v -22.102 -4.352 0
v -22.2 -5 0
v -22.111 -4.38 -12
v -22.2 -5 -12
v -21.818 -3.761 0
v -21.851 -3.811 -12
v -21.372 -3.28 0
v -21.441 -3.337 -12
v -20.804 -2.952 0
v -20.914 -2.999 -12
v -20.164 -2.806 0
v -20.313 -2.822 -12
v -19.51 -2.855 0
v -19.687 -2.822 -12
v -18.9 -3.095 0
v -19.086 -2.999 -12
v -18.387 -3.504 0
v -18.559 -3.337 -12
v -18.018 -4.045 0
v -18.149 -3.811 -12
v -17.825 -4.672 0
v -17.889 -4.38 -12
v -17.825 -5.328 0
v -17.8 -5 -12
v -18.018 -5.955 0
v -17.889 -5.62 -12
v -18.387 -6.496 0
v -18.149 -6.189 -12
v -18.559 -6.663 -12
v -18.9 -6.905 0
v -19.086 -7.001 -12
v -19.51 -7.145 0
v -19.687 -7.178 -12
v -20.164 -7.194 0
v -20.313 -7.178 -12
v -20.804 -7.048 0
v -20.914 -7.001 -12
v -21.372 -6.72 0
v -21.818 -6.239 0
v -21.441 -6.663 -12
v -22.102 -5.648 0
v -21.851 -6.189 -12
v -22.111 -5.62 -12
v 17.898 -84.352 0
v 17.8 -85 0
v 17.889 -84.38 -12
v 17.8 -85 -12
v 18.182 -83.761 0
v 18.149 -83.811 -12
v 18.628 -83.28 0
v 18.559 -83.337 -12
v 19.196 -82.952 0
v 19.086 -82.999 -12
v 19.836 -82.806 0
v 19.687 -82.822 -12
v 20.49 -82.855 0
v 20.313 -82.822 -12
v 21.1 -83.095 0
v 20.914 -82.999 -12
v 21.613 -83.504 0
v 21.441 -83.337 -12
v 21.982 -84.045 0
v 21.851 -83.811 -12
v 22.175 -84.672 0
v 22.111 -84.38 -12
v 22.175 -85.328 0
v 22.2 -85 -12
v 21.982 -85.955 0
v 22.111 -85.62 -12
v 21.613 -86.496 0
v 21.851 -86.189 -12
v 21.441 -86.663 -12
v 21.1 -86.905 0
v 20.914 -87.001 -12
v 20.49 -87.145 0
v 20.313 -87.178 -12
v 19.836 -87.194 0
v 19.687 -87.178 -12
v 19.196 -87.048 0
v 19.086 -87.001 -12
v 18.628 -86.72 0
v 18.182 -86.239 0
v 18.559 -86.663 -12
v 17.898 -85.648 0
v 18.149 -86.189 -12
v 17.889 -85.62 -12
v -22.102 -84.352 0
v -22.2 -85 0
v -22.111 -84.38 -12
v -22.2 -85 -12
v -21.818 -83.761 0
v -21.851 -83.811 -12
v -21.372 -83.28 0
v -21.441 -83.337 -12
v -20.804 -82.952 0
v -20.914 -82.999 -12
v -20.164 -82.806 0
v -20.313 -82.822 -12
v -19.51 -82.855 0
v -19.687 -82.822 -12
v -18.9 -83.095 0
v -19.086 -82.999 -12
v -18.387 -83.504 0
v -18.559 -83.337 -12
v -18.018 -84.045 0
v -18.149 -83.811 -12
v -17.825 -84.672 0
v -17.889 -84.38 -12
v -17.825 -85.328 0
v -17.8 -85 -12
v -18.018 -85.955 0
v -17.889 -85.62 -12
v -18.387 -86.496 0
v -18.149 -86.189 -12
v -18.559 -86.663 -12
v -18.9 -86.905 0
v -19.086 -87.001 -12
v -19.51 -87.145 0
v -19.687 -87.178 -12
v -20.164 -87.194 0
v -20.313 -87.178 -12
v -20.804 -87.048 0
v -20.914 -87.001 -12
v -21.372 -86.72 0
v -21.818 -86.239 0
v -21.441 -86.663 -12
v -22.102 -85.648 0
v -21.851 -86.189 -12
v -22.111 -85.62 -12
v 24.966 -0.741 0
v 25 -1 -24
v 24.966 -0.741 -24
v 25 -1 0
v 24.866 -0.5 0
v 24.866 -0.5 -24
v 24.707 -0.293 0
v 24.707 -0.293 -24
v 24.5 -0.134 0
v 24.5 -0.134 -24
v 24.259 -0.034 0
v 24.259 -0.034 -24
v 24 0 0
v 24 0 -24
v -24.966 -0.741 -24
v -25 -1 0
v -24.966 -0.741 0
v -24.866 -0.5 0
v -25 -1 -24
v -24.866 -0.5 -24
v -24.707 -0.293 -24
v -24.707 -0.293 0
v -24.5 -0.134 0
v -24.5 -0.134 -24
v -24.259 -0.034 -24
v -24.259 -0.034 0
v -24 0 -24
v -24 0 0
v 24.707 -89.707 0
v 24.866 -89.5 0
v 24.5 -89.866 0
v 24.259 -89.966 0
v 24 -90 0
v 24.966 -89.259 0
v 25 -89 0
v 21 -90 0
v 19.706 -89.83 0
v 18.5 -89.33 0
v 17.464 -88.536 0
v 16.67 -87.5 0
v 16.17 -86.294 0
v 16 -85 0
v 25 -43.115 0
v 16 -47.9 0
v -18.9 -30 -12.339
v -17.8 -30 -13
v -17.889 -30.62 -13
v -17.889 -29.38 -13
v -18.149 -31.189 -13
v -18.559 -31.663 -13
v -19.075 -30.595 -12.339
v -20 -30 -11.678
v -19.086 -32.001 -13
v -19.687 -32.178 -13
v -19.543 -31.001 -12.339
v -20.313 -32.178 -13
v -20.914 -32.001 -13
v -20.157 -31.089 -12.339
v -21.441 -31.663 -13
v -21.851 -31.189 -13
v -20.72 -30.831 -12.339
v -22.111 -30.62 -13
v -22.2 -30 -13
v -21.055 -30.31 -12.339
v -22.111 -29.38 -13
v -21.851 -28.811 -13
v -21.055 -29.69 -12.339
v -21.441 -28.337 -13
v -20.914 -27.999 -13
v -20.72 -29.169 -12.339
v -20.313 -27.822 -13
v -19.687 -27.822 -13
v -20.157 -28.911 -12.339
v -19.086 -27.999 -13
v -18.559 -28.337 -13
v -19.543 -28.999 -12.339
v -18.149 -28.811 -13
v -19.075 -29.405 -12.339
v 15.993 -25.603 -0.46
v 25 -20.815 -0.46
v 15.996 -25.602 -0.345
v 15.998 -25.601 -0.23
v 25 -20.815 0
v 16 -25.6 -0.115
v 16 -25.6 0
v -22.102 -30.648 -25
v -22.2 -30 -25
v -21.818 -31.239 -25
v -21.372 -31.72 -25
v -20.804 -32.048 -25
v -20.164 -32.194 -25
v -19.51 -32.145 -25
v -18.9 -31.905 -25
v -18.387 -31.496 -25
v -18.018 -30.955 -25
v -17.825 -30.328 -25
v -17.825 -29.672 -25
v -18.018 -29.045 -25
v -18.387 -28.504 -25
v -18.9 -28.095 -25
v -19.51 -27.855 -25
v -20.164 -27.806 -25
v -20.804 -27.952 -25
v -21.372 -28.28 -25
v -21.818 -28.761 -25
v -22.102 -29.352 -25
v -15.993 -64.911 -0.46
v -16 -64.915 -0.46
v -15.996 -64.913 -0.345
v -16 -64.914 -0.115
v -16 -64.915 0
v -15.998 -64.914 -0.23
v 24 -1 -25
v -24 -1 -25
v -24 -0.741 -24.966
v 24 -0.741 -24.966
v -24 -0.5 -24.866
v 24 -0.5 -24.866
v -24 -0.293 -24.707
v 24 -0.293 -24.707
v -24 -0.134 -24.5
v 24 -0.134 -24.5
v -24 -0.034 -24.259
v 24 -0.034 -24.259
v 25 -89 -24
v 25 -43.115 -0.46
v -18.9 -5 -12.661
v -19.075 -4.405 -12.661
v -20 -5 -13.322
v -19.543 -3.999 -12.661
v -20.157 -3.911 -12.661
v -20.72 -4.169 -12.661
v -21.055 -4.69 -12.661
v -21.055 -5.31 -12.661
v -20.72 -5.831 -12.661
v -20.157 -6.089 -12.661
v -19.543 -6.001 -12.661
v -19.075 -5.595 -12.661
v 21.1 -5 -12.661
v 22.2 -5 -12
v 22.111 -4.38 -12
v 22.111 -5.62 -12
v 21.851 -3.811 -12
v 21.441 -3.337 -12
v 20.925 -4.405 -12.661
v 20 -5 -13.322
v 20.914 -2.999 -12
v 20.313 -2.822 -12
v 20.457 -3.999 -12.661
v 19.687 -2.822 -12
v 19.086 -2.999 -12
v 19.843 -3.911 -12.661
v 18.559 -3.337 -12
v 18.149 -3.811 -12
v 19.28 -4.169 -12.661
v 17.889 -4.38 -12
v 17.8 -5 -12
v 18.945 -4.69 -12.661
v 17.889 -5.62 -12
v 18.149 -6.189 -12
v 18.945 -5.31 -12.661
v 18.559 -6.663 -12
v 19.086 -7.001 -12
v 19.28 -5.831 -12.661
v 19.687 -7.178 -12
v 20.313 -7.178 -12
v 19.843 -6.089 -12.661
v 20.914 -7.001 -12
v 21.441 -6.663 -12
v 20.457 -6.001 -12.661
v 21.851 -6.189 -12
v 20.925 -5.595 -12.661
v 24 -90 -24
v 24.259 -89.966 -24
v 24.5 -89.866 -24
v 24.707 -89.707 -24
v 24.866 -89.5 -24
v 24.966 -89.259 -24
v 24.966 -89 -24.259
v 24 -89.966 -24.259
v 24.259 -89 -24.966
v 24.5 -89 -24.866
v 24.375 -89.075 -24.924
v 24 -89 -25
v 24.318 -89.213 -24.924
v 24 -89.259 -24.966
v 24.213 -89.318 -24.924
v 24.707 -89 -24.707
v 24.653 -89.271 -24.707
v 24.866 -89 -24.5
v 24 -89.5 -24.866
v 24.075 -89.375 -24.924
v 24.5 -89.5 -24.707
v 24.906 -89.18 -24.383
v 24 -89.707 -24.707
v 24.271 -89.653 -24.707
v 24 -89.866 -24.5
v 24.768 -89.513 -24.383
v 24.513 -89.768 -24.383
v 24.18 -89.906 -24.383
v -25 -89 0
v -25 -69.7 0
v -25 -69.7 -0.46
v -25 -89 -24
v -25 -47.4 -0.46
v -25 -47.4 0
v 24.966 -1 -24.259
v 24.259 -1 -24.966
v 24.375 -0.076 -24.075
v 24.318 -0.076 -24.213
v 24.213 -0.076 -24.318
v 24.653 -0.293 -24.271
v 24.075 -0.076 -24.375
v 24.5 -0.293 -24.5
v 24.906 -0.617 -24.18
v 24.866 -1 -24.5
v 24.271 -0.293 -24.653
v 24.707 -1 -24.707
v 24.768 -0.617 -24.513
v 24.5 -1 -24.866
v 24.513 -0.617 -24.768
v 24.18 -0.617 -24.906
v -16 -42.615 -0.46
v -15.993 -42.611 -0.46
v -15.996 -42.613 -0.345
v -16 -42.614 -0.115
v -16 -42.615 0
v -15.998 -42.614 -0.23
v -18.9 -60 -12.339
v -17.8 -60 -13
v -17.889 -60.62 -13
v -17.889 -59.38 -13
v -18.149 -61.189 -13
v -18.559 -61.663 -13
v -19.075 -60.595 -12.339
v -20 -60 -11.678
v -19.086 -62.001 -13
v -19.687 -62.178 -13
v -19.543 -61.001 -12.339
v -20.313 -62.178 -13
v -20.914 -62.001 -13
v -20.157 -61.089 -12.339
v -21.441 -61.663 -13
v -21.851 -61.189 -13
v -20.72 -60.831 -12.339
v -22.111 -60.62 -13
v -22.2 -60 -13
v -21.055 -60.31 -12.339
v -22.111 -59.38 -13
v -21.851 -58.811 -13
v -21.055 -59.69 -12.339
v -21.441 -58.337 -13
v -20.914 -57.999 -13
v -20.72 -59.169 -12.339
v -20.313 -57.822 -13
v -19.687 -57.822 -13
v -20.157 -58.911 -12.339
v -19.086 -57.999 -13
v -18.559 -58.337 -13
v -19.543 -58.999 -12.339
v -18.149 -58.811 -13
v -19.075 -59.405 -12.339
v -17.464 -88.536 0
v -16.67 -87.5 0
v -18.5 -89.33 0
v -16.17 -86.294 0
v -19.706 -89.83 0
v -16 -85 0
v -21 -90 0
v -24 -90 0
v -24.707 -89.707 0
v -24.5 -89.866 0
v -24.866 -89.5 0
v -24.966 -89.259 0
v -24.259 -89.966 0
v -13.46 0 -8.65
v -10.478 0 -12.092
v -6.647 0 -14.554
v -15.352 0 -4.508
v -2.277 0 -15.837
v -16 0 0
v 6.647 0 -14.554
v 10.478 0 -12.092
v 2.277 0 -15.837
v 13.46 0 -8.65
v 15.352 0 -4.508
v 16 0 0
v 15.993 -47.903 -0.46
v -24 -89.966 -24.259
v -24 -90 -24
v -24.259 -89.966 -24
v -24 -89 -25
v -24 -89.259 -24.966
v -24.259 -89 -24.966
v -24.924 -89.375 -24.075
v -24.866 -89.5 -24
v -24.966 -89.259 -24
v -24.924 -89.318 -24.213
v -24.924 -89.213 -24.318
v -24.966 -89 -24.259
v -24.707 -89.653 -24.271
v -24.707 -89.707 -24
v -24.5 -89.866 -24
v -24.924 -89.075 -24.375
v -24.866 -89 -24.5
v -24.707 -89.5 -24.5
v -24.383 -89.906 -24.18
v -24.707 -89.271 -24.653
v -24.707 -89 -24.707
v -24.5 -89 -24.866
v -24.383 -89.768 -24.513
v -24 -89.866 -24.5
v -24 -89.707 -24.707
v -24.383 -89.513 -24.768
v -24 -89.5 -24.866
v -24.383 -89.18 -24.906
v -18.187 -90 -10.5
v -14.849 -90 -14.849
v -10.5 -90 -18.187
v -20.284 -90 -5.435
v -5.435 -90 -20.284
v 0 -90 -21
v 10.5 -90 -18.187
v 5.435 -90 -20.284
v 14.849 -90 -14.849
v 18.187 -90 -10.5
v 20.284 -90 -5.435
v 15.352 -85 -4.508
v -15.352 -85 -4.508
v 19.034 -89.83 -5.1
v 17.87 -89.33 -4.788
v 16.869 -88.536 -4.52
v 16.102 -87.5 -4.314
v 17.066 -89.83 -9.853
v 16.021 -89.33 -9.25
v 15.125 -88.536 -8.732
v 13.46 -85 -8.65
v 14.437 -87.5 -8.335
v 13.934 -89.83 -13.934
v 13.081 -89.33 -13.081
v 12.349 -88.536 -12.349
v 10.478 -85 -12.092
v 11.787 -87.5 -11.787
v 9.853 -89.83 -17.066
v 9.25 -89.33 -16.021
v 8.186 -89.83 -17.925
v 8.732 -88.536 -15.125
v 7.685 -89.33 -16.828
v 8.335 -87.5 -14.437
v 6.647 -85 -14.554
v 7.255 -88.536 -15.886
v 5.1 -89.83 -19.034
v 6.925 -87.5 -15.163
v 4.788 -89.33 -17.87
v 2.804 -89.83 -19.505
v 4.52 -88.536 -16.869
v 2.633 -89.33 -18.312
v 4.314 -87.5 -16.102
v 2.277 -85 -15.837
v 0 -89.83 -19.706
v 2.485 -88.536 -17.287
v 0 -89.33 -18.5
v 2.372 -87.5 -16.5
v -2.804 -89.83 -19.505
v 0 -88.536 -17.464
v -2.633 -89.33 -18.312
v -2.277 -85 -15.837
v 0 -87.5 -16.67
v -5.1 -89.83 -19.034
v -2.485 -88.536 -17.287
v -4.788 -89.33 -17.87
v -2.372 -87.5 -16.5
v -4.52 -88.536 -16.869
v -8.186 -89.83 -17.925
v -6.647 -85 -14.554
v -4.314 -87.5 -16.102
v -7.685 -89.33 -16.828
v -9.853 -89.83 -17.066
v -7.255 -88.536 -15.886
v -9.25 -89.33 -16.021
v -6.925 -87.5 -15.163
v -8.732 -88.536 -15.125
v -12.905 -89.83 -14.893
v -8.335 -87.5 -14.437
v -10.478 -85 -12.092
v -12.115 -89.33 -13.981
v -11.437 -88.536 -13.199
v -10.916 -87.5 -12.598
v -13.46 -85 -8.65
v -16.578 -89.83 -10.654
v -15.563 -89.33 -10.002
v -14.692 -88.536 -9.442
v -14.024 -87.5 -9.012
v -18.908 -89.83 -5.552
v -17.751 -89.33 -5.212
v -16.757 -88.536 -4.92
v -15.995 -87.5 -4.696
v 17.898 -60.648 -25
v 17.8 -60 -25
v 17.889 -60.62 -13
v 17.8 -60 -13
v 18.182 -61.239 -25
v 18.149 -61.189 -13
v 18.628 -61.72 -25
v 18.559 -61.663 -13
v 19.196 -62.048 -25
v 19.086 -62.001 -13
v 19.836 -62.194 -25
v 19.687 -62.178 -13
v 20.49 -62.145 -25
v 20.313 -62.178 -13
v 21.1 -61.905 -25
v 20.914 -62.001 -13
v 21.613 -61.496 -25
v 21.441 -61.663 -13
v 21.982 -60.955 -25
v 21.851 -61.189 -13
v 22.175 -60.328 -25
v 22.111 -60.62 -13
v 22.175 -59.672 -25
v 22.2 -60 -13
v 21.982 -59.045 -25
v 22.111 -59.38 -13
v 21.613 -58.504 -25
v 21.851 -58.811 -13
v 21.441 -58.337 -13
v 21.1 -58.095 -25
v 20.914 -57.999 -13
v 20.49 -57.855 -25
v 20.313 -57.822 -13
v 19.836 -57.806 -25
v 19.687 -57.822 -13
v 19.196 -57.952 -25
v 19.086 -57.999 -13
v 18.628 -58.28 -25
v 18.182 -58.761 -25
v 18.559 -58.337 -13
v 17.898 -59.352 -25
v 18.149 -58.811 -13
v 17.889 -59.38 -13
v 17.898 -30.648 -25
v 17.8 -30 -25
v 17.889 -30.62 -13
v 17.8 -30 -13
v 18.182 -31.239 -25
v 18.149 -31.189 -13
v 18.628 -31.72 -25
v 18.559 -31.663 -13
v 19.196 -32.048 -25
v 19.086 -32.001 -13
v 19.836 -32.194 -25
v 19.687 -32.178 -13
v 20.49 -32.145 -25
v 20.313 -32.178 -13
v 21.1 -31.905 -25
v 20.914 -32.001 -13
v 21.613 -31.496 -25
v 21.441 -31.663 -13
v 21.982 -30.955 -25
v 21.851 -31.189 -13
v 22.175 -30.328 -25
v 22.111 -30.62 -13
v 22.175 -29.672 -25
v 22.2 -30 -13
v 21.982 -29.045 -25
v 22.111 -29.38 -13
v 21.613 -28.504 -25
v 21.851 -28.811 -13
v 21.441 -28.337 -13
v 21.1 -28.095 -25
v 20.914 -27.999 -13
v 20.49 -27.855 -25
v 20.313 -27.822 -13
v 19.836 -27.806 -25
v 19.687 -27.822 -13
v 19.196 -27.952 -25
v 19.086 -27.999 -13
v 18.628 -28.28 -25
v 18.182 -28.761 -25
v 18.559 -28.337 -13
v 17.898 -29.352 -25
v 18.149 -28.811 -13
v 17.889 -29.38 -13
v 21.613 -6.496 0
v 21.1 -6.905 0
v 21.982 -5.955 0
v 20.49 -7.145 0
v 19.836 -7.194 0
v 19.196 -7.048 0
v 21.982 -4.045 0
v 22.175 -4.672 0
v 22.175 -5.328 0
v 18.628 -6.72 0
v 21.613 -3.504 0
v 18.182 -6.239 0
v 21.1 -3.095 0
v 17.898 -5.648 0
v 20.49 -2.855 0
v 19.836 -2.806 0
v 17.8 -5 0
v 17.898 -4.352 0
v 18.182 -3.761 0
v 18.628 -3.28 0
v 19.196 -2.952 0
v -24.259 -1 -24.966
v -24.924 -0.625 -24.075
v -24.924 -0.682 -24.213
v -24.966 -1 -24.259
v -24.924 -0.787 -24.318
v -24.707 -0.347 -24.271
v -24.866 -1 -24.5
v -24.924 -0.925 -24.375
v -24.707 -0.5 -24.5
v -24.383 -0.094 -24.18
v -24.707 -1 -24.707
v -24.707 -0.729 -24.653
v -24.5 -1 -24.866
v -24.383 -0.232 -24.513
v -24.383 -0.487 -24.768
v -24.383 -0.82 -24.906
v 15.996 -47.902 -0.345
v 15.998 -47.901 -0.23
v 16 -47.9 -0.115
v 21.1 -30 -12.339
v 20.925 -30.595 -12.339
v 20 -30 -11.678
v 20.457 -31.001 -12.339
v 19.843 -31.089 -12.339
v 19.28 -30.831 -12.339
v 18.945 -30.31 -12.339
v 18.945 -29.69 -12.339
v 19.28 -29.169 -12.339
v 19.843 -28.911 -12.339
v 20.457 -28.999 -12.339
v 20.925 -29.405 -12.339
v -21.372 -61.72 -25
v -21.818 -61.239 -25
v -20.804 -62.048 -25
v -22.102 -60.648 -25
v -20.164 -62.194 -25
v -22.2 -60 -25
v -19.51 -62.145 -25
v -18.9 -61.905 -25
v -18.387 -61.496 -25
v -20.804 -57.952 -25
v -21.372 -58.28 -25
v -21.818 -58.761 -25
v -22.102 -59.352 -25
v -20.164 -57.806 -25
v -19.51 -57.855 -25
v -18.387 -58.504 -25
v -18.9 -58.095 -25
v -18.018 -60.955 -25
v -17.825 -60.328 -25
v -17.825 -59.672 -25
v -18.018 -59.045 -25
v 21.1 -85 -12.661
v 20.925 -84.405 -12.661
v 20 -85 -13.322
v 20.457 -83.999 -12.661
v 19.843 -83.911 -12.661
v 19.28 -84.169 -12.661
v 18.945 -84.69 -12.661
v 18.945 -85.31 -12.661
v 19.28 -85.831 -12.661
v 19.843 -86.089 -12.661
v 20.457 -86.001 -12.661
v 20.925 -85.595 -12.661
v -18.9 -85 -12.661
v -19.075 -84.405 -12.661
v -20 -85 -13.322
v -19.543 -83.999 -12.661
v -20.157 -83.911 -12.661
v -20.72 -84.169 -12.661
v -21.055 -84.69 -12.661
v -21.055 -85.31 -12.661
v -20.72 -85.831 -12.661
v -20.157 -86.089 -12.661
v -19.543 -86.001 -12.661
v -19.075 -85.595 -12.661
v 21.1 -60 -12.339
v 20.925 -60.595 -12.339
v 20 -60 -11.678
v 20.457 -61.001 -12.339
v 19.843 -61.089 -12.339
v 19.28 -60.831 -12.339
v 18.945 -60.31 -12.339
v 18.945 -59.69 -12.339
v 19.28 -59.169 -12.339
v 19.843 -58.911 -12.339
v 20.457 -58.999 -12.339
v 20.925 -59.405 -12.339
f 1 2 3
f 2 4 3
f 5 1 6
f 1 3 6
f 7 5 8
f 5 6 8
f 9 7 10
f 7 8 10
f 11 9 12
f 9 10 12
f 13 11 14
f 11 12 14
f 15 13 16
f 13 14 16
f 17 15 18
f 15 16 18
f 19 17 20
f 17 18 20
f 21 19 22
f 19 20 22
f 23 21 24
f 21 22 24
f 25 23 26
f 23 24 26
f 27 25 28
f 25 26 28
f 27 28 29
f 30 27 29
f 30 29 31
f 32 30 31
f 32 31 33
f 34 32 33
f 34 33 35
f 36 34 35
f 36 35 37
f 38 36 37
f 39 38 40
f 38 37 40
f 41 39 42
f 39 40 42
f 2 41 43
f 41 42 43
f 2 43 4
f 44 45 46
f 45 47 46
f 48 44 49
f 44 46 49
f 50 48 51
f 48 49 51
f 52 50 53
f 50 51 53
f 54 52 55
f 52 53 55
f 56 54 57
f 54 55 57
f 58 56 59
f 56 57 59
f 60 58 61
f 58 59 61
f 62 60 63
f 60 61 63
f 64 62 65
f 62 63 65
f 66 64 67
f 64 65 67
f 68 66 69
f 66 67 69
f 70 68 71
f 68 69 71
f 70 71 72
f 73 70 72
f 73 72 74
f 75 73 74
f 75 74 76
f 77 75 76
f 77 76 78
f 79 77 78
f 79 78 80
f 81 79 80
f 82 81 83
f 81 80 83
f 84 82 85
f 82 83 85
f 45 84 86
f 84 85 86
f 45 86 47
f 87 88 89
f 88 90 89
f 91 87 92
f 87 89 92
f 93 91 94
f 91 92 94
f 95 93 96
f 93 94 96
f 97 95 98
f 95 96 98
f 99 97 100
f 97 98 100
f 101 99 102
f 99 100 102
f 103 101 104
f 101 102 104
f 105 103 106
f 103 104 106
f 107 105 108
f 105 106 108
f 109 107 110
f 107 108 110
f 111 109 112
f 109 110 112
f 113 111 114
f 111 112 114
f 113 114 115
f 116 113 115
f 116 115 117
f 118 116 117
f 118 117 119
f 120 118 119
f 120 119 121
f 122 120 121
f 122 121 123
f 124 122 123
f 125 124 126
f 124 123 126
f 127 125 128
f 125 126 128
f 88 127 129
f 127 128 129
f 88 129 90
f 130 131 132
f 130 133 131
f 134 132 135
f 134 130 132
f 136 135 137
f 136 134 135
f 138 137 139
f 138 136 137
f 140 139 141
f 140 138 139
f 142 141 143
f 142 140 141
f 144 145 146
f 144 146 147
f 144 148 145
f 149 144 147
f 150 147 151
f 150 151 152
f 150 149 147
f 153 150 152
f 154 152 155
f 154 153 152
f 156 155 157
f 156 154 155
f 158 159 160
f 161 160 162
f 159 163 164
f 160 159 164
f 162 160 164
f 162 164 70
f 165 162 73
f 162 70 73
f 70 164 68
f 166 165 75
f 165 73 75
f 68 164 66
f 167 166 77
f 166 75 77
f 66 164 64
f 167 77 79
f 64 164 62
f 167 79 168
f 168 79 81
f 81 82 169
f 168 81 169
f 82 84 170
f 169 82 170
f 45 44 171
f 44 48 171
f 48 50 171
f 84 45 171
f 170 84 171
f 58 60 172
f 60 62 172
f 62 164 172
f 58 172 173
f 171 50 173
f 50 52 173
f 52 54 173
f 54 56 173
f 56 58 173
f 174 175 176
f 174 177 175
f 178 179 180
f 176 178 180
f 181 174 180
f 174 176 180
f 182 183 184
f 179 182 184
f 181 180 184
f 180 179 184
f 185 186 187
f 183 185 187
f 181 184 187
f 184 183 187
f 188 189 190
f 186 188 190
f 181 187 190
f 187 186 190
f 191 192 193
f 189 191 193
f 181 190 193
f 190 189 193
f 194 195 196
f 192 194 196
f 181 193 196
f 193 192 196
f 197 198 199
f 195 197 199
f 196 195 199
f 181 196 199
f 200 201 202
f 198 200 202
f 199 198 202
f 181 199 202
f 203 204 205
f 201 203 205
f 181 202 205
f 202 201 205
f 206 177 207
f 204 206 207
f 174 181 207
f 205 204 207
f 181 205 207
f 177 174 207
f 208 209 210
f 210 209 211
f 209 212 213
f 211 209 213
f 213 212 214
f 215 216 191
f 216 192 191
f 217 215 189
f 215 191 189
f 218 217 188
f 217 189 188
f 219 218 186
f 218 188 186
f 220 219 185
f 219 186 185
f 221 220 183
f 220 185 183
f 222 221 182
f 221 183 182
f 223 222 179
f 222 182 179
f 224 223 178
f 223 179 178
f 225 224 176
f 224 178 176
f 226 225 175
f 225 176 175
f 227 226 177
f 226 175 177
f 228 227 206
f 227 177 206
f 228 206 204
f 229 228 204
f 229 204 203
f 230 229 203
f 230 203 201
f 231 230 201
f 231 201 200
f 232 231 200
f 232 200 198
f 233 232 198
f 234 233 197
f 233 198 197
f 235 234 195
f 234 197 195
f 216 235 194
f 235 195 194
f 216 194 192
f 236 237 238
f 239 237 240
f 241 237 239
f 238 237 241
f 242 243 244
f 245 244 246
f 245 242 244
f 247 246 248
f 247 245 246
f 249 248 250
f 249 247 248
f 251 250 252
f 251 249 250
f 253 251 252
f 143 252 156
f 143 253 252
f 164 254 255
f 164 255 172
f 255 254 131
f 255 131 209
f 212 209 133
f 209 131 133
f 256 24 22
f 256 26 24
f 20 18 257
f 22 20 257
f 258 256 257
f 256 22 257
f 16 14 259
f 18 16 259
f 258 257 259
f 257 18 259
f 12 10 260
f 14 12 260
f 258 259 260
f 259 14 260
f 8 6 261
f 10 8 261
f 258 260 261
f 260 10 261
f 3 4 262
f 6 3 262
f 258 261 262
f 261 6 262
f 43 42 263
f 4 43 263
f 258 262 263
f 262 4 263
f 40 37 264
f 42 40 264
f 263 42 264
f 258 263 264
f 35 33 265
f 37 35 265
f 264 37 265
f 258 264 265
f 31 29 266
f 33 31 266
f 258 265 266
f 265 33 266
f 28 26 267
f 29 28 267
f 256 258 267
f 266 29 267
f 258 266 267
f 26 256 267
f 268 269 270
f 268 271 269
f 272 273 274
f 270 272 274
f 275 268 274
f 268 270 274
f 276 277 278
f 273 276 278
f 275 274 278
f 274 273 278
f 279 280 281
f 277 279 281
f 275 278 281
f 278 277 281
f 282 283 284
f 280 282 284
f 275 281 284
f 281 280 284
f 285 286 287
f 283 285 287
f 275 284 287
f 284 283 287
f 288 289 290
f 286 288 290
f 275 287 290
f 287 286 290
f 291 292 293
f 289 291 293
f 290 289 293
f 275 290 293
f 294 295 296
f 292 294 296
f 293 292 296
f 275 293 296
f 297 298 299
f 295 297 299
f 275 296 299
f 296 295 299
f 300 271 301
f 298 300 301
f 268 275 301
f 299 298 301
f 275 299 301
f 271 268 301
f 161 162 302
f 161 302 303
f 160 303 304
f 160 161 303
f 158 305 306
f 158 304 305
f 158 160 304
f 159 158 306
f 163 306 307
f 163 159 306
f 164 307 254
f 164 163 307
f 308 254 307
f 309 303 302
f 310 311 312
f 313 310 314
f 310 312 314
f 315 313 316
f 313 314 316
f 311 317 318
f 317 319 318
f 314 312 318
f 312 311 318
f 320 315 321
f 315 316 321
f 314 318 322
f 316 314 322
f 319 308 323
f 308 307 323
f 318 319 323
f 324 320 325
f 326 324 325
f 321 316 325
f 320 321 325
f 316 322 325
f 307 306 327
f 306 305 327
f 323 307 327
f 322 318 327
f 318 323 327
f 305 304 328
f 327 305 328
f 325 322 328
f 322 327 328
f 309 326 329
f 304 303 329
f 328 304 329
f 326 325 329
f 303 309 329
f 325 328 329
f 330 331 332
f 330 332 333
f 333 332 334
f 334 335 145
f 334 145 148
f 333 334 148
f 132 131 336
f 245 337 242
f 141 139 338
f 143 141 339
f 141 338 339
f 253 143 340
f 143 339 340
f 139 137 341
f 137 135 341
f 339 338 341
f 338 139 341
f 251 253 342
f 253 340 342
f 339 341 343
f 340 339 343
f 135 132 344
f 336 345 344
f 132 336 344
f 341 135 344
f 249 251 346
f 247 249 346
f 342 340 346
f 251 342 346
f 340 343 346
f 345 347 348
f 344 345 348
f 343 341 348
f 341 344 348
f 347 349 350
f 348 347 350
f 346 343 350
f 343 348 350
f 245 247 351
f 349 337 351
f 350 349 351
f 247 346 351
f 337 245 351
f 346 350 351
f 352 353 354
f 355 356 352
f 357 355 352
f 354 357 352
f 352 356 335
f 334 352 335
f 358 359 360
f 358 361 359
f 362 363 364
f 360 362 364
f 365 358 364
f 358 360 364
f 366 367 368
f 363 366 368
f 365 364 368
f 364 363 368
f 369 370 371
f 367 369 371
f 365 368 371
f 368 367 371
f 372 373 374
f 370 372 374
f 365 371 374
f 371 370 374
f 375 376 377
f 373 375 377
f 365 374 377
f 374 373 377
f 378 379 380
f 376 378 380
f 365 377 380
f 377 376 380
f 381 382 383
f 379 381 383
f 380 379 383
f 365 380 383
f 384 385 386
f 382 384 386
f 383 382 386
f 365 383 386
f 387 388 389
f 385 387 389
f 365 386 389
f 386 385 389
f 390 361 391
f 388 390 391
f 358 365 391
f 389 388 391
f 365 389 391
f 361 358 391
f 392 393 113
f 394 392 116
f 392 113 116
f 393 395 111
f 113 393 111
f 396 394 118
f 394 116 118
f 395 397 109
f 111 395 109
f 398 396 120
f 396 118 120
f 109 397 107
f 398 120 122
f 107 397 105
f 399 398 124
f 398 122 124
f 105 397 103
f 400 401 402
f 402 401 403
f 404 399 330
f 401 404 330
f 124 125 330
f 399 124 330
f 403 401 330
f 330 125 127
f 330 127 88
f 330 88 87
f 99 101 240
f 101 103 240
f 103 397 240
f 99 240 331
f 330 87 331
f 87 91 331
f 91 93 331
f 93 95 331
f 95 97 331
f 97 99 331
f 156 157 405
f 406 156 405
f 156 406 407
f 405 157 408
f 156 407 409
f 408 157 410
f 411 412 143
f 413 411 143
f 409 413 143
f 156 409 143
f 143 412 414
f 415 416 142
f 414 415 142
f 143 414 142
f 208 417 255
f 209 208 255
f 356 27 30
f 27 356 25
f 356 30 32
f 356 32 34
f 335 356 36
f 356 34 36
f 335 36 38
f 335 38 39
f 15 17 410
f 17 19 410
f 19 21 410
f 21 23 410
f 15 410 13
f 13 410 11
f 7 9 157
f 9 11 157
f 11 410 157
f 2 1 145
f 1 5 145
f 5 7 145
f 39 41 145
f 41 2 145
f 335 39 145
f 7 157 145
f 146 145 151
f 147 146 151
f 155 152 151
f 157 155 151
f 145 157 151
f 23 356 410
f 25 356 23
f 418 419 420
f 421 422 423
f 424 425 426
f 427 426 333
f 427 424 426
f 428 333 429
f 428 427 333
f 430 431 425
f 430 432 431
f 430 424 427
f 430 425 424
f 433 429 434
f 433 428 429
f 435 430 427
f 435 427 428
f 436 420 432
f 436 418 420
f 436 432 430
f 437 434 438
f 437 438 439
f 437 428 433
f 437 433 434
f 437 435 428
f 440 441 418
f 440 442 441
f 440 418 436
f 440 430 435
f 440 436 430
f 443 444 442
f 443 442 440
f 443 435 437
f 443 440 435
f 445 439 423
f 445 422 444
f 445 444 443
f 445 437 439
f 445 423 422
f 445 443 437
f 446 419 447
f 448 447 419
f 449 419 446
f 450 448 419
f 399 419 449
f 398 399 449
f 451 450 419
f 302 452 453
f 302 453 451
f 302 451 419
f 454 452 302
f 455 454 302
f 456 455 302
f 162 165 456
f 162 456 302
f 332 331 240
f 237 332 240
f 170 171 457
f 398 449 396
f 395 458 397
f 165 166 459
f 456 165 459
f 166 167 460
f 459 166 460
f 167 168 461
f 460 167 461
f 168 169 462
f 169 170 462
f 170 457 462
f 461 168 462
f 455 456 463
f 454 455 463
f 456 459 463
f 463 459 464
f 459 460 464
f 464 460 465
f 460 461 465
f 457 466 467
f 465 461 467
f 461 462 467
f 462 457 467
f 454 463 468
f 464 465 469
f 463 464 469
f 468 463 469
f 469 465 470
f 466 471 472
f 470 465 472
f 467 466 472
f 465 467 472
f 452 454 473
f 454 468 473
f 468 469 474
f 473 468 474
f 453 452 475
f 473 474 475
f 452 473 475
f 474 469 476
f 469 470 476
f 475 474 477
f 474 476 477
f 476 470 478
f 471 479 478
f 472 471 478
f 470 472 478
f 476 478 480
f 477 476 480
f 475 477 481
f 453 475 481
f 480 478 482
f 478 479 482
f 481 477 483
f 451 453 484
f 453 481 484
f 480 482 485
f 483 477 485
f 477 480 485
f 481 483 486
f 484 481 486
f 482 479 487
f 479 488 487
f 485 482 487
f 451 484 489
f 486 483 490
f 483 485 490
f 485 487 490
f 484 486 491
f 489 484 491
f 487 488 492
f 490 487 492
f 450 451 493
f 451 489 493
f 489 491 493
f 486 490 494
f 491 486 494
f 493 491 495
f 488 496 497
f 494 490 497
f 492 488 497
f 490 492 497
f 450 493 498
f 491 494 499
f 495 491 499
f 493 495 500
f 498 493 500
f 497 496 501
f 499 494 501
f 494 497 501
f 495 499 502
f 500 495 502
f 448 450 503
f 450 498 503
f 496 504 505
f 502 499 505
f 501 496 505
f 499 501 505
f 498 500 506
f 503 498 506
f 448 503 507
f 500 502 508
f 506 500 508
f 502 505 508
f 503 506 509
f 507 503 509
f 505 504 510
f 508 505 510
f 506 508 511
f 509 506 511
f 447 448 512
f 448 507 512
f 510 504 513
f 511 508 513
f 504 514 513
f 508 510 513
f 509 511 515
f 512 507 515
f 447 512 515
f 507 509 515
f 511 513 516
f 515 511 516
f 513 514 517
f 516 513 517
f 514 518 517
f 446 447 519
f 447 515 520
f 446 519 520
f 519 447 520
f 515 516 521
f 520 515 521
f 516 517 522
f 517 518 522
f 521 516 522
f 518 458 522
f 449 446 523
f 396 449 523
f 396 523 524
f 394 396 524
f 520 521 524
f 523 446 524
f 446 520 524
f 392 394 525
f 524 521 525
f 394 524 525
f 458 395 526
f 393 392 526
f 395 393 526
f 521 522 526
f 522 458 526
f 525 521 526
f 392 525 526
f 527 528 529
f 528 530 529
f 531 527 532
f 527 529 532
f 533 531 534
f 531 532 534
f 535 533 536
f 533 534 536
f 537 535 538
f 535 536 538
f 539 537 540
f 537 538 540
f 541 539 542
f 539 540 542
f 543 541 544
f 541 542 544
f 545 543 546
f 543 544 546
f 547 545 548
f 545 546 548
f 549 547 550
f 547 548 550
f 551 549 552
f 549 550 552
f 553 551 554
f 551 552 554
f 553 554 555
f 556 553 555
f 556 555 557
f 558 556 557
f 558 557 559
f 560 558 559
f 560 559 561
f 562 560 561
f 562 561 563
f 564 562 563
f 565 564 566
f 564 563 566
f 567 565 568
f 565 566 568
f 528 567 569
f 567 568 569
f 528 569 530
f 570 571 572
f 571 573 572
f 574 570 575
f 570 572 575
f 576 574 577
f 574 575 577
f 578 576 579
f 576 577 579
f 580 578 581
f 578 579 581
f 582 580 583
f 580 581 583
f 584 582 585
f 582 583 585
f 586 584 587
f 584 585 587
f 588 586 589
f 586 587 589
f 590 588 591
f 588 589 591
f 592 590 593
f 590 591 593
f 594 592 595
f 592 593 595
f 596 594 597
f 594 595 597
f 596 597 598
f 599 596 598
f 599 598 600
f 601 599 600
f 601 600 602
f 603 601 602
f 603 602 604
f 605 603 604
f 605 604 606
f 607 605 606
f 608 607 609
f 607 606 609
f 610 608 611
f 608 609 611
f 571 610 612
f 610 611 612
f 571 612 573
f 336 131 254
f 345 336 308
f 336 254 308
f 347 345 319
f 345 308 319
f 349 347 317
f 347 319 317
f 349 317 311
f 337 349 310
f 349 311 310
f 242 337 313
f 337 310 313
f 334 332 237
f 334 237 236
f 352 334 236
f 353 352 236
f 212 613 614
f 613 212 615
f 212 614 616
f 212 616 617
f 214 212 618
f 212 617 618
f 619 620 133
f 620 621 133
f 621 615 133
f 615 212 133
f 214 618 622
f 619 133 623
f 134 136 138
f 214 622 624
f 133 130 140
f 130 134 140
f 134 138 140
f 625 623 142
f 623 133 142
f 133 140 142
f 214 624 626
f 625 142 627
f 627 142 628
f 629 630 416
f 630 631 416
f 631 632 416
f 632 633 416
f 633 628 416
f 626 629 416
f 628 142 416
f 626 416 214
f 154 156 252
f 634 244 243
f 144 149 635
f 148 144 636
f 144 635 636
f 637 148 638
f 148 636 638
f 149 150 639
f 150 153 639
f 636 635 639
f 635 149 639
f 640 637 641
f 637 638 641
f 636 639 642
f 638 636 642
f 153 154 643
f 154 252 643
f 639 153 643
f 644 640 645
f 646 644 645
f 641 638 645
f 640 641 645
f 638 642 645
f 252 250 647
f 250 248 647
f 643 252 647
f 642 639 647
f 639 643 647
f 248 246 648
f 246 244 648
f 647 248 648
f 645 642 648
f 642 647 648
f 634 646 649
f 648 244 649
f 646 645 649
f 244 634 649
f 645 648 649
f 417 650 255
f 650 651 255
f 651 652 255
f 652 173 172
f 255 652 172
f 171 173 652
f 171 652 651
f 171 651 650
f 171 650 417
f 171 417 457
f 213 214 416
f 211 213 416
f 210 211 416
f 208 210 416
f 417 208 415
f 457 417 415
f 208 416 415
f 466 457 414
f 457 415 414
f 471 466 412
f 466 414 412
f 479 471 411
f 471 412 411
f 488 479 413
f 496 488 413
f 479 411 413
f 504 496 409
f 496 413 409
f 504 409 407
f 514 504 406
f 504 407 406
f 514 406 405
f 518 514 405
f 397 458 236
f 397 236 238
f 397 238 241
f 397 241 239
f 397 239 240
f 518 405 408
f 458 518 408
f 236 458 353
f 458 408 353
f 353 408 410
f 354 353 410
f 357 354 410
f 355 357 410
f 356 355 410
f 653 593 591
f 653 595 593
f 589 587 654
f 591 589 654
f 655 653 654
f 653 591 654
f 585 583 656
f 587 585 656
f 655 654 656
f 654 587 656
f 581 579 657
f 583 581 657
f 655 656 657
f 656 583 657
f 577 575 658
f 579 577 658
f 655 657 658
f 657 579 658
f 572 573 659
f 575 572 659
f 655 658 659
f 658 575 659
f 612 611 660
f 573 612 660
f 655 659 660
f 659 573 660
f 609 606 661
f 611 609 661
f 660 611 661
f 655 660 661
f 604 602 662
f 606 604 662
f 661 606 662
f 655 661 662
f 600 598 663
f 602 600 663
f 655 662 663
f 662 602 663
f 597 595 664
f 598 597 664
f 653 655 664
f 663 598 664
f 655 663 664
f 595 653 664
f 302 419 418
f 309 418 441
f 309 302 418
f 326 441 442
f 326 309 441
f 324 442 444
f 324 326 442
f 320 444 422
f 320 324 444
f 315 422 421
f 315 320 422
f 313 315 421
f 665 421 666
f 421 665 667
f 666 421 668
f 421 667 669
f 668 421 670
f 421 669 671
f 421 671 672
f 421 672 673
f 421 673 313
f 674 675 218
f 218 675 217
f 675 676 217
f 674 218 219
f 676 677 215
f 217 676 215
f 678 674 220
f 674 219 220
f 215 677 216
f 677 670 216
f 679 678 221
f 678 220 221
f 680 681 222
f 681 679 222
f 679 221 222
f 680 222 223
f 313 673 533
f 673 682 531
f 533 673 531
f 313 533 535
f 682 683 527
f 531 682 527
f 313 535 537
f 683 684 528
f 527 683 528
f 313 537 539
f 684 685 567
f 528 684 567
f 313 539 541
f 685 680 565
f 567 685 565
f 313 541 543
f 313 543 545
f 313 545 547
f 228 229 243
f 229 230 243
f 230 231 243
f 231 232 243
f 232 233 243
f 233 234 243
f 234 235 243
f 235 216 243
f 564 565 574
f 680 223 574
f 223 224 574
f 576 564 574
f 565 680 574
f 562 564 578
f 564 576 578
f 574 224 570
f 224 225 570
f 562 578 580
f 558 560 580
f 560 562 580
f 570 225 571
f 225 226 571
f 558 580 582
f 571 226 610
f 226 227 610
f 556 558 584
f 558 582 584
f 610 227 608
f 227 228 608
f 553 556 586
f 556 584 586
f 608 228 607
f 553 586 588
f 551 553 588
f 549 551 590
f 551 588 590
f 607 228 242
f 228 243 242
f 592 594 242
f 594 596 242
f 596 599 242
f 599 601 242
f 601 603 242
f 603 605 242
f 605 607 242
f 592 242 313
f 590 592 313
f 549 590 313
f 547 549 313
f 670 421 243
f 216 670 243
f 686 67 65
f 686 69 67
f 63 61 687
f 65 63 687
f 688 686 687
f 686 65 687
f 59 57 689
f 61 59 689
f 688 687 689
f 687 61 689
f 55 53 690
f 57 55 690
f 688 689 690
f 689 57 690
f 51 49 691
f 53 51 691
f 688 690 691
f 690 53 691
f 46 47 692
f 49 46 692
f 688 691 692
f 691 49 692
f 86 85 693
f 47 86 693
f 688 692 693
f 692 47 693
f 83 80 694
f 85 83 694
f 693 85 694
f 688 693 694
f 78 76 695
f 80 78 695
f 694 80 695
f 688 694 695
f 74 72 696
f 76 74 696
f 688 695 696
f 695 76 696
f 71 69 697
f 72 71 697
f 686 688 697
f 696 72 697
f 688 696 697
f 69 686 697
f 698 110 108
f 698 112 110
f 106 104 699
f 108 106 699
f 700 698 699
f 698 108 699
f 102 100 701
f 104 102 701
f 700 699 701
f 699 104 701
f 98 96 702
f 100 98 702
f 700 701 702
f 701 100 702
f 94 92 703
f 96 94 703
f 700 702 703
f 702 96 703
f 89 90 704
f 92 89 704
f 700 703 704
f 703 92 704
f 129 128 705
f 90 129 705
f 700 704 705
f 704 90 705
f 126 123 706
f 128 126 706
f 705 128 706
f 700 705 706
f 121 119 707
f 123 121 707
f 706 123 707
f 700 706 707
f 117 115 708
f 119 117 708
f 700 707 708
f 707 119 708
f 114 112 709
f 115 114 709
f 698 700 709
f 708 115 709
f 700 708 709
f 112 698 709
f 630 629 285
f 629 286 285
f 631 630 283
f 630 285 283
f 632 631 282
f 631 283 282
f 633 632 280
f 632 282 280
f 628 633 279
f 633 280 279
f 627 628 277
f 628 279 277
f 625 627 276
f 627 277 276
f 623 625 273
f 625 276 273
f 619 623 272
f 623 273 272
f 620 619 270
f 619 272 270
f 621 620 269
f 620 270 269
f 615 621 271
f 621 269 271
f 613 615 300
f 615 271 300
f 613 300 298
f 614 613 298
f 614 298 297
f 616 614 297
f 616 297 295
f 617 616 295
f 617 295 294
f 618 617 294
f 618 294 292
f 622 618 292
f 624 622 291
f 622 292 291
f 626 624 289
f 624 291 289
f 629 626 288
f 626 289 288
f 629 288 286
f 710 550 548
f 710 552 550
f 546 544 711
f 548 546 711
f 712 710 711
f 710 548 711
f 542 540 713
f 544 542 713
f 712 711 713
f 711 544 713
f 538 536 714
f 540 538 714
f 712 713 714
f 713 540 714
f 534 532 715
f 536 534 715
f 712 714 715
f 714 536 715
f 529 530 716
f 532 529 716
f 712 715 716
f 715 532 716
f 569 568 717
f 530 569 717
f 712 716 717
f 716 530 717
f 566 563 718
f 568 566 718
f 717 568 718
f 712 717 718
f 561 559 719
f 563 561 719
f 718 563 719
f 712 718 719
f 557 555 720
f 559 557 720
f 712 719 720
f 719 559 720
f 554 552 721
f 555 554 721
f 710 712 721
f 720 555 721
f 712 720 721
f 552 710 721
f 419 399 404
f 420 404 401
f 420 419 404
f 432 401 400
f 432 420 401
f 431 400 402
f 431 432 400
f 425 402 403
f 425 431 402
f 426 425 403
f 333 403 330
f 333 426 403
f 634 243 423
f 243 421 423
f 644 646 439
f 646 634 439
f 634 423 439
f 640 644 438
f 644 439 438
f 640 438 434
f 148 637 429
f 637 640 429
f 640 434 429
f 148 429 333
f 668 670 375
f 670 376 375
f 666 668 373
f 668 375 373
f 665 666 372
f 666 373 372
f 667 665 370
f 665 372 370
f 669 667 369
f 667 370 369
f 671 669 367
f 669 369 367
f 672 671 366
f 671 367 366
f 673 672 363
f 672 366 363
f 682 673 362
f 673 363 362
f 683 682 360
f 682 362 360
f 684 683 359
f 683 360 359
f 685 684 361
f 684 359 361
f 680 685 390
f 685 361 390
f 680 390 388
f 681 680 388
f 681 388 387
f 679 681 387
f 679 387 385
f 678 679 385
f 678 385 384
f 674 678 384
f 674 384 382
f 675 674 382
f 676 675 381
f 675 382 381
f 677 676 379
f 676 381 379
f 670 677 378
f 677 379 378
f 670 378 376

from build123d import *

# Parameters (mm, degrees)
F1_DEPTH = 90
F3_D     = 4.4
F3_DEPTH = 12
F3_TIP   = 1.3218933619
F4_R     = 5
F6_DEPTH = 0.46
F7_R     = 1
F9_D     = 4.4
F9_DEPTH = 12
F9_TIP   = 1.3218933619


with BuildPart() as f1:
    # F0 (on Front) → F1 (new body)
    with BuildSketch(Plane.XZ):
        with BuildLine():
            Line((-25, -25), (25, -25))
            Line((25, -25), (25, 0))
            Line((25, 0), (16, 0))
            ThreePointArc((16, 0), (0, -16), (-16, 0))
            Line((-16, 0), (-25, 0))
            Line((-25, 0), (-25, -25))
        make_face()
    extrude(amount=F1_DEPTH)

    # F3
    with Locations(Plane.XY):
        with Locations((-20, -5), (20, -5), (20, -85), (-20, -85)):
            Hole(F3_D / 2, depth=F3_DEPTH)
            with Locations((0, 0, -(F3_DEPTH + F3_TIP / 2))):  # 118° drill point
                Cone(0, F3_D / 2, F3_TIP, mode=Mode.SUBTRACT)

    # F4
    f4_edges = [f1.edges().sort_by_distance(p)[0] for p in [
        (0, -90, -16),
    ]]
    fillet(f4_edges, radius=F4_R)

    # F5 (on face) → F6 (cut)
    with BuildSketch(Plane.XY):
        Polygon((-16, -42.614615115), (-16, -64.914615115), (31.2709680734, -39.7801955466), (31.2709680734, -17.4801955466), align=None)
        Polygon((-25, -47.4), (-25, -69.7), (-16, -64.914615115), (-16, -42.614615115), align=None)
    extrude(amount=-F6_DEPTH, mode=Mode.SUBTRACT)

    # F7
    f7_edges = [f1.edges().sort_by_distance(p)[0] for p in [
        (25, -90, -12.5),
        (25, -45, -25),
        (25, 0, -12.5),
        (0, -90, -25),
        (-25, -90, -12.5),
        (0, 0, -25),
        (-25, 0, -12.5),
        (-25, -45, -25),
    ]]
    fillet(f7_edges, radius=F7_R)

    # F9
    with Locations(Plane(origin=(0, 0, -25), x_dir=(1, 0, 0), z_dir=(0, 0, -1))):
        with Locations((20, 30), (-20, 30), (-20, 60), (20, 60)):
            Hole(F9_D / 2, depth=F9_DEPTH)
            with Locations((0, 0, -(F9_DEPTH + F9_TIP / 2))):  # 118° drill point
                Cone(0, F9_D / 2, F9_TIP, mode=Mode.SUBTRACT)


solid = f1.part
